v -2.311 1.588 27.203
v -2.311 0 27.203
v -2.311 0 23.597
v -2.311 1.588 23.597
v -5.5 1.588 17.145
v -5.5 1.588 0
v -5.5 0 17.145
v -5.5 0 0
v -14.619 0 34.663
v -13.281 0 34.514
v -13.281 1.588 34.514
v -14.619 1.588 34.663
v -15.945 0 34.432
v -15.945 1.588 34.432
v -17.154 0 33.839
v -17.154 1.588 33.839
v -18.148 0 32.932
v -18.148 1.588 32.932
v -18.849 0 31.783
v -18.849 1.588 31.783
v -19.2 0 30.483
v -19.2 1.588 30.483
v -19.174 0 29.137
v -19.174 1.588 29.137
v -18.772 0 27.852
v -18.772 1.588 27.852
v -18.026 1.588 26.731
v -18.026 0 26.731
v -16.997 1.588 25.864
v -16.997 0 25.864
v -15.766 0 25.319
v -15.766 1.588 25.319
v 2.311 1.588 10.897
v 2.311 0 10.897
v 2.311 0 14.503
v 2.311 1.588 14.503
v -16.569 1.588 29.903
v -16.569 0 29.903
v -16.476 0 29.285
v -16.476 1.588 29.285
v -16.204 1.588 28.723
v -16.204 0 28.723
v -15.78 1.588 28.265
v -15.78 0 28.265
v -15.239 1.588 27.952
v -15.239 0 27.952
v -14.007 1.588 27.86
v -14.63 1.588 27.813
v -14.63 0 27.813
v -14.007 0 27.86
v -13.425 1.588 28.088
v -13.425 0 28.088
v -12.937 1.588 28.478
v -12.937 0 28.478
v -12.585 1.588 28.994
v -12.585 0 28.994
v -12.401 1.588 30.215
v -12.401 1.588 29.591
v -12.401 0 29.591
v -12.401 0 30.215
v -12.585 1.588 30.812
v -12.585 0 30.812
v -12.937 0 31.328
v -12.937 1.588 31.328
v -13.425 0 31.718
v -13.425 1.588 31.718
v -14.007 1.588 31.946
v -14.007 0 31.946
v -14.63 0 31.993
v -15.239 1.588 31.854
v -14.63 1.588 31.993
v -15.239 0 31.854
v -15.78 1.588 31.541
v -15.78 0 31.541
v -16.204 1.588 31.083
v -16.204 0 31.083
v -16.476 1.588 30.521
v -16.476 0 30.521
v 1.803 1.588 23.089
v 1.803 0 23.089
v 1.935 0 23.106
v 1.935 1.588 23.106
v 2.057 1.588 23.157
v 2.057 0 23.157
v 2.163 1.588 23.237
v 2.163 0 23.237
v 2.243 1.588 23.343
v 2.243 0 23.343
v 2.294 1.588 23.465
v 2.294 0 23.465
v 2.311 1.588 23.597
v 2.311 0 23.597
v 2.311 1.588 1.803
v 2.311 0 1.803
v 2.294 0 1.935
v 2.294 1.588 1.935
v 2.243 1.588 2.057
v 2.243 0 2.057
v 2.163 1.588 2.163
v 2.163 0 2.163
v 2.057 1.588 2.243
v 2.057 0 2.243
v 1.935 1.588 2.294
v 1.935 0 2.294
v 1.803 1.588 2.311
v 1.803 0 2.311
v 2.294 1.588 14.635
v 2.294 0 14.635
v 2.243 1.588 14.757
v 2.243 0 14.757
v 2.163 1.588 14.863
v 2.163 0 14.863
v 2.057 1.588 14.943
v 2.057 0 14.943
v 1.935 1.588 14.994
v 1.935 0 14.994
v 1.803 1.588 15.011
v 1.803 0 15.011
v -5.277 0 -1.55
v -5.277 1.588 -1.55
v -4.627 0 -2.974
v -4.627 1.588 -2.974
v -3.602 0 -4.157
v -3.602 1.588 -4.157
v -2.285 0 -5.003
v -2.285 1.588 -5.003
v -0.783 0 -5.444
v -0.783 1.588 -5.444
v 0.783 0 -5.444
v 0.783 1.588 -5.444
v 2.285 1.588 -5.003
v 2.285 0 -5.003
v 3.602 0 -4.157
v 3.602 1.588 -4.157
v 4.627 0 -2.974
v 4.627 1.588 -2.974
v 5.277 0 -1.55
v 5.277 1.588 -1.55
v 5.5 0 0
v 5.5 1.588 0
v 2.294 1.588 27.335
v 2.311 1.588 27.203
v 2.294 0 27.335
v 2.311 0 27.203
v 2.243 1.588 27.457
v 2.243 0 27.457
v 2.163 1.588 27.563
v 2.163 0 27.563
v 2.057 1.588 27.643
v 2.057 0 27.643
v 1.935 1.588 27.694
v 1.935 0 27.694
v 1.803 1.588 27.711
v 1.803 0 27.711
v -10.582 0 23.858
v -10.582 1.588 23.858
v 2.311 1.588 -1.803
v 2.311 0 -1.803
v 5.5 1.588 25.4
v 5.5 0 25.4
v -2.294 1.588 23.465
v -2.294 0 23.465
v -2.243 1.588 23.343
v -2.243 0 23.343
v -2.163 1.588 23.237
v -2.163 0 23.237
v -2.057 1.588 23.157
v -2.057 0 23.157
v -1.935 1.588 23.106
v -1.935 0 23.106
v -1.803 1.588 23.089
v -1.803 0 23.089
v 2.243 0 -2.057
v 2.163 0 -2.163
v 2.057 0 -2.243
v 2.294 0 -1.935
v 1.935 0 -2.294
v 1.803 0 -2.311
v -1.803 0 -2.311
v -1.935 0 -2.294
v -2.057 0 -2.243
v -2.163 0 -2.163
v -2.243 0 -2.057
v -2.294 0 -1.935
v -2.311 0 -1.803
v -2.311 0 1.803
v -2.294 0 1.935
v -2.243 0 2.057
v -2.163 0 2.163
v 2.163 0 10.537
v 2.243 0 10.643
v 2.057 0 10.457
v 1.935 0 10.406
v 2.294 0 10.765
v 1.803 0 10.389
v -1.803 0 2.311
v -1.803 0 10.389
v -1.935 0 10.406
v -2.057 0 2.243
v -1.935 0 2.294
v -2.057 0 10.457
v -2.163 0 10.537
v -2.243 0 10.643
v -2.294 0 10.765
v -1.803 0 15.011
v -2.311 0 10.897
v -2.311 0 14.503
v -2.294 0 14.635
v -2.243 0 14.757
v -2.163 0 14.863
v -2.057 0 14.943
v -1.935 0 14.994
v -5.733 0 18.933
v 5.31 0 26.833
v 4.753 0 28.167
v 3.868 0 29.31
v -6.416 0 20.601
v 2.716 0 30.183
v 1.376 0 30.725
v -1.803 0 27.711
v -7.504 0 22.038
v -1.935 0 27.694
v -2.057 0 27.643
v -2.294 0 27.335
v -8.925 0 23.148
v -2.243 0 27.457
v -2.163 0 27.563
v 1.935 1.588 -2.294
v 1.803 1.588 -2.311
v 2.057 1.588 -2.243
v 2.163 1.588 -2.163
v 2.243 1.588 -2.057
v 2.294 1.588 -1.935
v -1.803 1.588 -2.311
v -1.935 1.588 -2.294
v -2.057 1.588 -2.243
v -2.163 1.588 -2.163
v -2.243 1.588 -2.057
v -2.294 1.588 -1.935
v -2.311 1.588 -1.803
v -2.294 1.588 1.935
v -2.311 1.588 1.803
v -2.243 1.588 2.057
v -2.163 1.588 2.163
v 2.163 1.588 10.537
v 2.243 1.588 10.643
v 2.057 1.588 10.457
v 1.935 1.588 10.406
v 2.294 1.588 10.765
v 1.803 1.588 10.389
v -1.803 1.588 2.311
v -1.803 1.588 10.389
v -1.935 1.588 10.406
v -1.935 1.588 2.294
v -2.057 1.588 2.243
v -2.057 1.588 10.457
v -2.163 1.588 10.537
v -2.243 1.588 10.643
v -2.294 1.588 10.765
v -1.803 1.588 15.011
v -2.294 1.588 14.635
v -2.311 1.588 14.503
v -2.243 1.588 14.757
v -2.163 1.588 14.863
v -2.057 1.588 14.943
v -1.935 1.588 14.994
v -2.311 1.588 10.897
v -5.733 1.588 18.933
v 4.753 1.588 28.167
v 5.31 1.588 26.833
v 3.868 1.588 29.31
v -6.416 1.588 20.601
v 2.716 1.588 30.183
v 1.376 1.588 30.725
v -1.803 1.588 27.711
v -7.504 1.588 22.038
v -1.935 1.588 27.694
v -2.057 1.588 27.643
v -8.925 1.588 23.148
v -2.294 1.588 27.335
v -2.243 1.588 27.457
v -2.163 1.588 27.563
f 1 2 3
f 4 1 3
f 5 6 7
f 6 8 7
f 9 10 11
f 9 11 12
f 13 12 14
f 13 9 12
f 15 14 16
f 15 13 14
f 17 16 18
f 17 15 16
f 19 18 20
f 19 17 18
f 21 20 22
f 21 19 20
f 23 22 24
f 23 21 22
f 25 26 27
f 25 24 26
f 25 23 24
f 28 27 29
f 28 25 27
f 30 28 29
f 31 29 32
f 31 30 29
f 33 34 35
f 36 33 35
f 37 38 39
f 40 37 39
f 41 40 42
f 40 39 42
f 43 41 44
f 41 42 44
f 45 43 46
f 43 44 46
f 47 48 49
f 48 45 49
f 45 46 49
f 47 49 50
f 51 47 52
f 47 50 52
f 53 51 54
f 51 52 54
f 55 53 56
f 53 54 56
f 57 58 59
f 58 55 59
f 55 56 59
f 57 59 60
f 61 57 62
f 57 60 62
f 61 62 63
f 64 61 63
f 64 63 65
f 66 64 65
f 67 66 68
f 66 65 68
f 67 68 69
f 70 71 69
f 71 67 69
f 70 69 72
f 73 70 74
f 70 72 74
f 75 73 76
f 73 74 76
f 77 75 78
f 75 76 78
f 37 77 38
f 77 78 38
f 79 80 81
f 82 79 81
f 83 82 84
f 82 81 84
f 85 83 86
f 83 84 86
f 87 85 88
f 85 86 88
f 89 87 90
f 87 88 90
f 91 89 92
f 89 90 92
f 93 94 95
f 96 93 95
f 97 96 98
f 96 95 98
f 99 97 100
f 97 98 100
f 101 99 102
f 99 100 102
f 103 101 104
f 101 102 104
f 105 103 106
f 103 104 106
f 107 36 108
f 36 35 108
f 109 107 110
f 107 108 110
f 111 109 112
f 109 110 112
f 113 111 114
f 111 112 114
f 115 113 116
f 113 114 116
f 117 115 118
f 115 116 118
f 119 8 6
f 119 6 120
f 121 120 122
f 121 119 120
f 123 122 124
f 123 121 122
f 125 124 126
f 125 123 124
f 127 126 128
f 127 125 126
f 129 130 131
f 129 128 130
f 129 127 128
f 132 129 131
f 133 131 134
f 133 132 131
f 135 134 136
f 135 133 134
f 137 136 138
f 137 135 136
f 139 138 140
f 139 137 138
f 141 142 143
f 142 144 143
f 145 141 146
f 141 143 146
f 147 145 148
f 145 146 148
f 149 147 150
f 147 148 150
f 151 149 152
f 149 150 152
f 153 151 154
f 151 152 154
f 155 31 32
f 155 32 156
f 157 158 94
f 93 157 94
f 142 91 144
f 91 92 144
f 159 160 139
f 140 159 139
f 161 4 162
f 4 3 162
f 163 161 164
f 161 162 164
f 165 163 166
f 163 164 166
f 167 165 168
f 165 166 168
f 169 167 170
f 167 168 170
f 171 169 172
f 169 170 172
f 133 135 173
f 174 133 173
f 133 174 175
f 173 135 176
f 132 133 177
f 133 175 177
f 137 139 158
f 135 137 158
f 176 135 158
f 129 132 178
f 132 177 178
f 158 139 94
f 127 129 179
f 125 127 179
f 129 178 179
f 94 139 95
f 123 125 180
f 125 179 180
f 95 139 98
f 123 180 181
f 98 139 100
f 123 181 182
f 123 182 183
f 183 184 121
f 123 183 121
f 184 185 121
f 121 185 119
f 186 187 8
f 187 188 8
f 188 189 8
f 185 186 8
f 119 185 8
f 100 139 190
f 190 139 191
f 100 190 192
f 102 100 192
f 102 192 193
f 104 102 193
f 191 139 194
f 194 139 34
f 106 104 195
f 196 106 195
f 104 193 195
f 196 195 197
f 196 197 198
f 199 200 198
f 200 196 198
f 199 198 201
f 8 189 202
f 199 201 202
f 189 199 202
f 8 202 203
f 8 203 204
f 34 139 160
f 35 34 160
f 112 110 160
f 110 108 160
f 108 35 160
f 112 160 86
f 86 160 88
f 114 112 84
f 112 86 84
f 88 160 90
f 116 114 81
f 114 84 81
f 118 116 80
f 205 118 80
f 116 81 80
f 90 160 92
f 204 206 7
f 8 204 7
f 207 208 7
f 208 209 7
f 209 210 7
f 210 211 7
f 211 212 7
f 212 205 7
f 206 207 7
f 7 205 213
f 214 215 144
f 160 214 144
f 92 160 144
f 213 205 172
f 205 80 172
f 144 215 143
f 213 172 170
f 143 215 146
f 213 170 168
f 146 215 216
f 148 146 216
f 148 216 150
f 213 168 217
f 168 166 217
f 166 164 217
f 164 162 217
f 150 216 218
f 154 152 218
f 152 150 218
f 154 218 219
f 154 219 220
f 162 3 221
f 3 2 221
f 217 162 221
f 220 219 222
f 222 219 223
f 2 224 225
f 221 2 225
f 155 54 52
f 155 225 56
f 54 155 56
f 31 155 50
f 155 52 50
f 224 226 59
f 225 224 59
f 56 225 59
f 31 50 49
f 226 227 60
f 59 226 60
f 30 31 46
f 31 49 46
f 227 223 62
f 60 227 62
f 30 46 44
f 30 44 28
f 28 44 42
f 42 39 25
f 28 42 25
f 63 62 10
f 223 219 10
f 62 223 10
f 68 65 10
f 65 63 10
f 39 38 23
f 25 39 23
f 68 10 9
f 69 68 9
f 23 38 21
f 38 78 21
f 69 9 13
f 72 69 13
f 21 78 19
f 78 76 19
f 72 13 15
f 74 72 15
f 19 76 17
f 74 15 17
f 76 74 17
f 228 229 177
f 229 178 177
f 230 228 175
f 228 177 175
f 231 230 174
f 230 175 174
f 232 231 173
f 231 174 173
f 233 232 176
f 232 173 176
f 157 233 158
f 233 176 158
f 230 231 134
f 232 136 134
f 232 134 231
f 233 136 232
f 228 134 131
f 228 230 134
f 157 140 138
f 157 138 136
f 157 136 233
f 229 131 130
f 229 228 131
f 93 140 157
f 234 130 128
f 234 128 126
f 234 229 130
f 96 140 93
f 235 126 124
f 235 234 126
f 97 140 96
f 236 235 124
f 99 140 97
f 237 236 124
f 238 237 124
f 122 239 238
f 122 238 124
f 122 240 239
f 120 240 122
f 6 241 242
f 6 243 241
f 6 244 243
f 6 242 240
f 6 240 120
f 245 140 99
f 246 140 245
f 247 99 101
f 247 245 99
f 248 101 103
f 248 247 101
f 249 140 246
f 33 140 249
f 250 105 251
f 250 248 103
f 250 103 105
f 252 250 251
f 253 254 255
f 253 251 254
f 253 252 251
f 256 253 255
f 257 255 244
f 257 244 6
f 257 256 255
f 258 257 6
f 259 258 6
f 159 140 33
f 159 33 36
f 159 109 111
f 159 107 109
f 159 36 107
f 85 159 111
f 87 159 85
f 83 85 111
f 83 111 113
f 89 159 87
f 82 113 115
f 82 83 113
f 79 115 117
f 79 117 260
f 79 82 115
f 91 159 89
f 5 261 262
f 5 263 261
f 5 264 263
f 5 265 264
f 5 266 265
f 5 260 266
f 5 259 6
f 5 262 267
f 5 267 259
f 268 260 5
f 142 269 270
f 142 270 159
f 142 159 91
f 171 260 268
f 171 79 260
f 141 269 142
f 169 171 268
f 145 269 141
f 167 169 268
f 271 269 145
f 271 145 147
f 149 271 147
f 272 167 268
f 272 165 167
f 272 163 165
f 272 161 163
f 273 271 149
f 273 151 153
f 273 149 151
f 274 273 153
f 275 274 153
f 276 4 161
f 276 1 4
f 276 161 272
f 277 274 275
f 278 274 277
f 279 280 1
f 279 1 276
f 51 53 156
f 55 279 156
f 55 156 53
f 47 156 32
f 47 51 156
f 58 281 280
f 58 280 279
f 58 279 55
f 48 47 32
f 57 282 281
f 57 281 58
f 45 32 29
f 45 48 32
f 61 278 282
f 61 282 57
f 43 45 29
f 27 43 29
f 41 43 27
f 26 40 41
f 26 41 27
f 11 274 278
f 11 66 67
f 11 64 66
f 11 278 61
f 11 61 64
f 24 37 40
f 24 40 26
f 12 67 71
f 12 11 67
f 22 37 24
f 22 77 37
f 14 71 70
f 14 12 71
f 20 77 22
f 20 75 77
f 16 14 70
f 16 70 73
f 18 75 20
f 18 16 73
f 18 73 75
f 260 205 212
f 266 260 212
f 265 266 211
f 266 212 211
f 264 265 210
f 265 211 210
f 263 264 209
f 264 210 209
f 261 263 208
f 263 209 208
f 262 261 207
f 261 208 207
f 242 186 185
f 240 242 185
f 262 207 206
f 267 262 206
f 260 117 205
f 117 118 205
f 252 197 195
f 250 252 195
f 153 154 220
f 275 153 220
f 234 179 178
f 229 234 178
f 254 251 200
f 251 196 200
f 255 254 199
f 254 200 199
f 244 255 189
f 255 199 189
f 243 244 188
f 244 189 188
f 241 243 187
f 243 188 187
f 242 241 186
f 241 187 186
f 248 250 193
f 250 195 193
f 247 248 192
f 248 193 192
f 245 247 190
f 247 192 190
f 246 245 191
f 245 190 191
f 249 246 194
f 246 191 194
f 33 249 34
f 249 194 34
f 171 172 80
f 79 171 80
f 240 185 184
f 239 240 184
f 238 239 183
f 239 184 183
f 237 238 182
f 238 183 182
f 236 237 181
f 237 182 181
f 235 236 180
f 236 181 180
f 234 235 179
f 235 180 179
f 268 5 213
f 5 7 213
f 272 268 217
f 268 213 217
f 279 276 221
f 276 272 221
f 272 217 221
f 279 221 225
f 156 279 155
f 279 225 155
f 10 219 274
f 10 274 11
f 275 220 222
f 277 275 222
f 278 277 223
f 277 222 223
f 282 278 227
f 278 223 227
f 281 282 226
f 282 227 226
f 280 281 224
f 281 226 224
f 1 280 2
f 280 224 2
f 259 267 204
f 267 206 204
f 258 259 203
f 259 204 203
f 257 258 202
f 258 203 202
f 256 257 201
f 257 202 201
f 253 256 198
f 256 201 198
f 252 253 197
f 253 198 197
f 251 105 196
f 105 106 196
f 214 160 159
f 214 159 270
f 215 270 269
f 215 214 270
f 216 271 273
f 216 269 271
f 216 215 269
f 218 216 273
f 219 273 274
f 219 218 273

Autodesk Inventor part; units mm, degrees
ref_plane "YZ Plane" through (0, 0, 0) normal (1, 0, 0) x (0, 1, 0)
ref_plane "XZ Plane" through (0, 0, 0) normal (0, 1, 0) x (-1, 0, 0)
ref_plane "XY Plane" through (0, 0, 0) normal (0, 0, 1) x (1, 0, 0)
sketch "hole" plane through (0, 0, 0) normal (0, 0, 1) x (1, 0, 0)
  line L0 (16.5616, -7.6441) -> (20.1684, -7.6441)
  line L1 (20.6764, -8.1521) -> (20.6764, -11.7589)
  line L2 (20.1684, -12.2669) -> (16.5616, -12.2669)
  line L3 (16.0536, -11.7589) -> (16.0536, -8.1521)
  line L4 (16.0536, -7.6441) -> (20.6764, -12.2669) construction
  line L5 (20.6764, -7.6441) -> (16.0536, -12.2669) construction
  arc A0 (20.6764, -8.1521) -> (20.1684, -7.6441) centre (20.1684, -8.1521) ccw
  arc A1 (20.1684, -12.2669) -> (20.6764, -11.7589) centre (20.1684, -11.7589) ccw
  arc A2 (16.0536, -11.7589) -> (16.5616, -12.2669) centre (16.5616, -11.7589) ccw
  arc A3 (16.5616, -7.6441) -> (16.0536, -8.1521) centre (16.5616, -8.1521) ccw
  point P0 (18.365, -9.9555)
  dimension "d6" = 4.6228
  dimension "d7" = 4.6228
  dimension "d8" = 0.508
sketch "main" plane through (0, 0, 0) normal (0, 0, 1) x (1, 0, 0)
  arc A0 (12.865, -9.9555) -> (23.865, -9.9555) centre (18.365, -9.9555) ccw
  line L0 (12.865, 15.4445) -> (12.865, -9.9555)
  line L1 (23.865, -9.9555) -> (23.865, 7.1895)
  circle A1 centre (32.8381, 19.9475) radius 2.0955
  arc A2 (34.1305, 15.3637) -> (31.6462, 24.5584) centre (32.8381, 19.9475) ccw
  arc A3 (16.9885, 20.7695) -> (12.865, 15.4445) centre (18.365, 15.4445) ccw
  line L2 (16.9885, 20.7695) -> (31.6462, 24.5584)
  line L3 (34.1305, 15.3637) -> (28.9468, 13.9022)
  arc A4 (28.9468, 13.9022) -> (23.865, 7.1895) centre (30.8394, 7.1895) ccw
  line L4 (16.5616, -7.6441) -> (20.1684, -7.6441)
  line L5 (20.6764, -8.1521) -> (20.6764, -11.7589)
  line L6 (20.1684, -12.2669) -> (16.5616, -12.2669)
  line L7 (16.0536, -11.7589) -> (16.0536, -8.1521)
  line L8 (16.0536, -7.6441) -> (20.6764, -12.2669) construction
  line L9 (20.6764, -7.6441) -> (16.0536, -12.2669) construction
  arc A5 (20.6764, -8.1521) -> (20.1684, -7.6441) centre (20.1684, -8.1521) ccw
  arc A6 (20.1684, -12.2669) -> (20.6764, -11.7589) centre (20.1684, -11.7589) ccw
  arc A7 (16.0536, -11.7589) -> (16.5616, -12.2669) centre (16.5616, -11.7589) ccw
  arc A8 (16.5616, -7.6441) -> (16.0536, -8.1521) centre (16.5616, -8.1521) ccw
  line L10 (16.5616, 5.0559) -> (20.1684, 5.0559)
  line L11 (20.6764, 4.5479) -> (20.6764, 0.9411)
  line L12 (20.1684, 0.4331) -> (16.5616, 0.4331)
  line L13 (16.0536, 0.9411) -> (16.0536, 4.5479)
  line L14 (16.0536, 5.0559) -> (20.6764, 0.4331) construction
  line L15 (20.6764, 5.0559) -> (16.0536, 0.4331) construction
  arc A9 (20.6764, 4.5479) -> (20.1684, 5.0559) centre (20.1684, 4.5479) ccw
  arc A10 (20.1684, 0.4331) -> (20.6764, 0.9411) centre (20.1684, 0.9411) ccw
  arc A11 (16.0536, 0.9411) -> (16.5616, 0.4331) centre (16.5616, 0.9411) ccw
  arc A12 (16.5616, 5.0559) -> (16.0536, 4.5479) centre (16.5616, 4.5479) ccw
  line L16 (16.5616, 17.7559) -> (20.1684, 17.7559)
  line L17 (20.6764, 17.2479) -> (20.6764, 13.6411)
  line L18 (20.1684, 13.1331) -> (16.5616, 13.1331)
  line L19 (16.0536, 13.6411) -> (16.0536, 17.2479)
  line L20 (16.0536, 17.7559) -> (20.6764, 13.1331) construction
  line L21 (20.6764, 17.7559) -> (16.0536, 13.1331) construction
  arc A13 (20.6764, 17.2479) -> (20.1684, 17.7559) centre (20.1684, 17.2479) ccw
  arc A14 (20.1684, 13.1331) -> (20.6764, 13.6411) centre (20.1684, 13.6411) ccw
  arc A15 (16.0536, 13.6411) -> (16.5616, 13.1331) centre (16.5616, 13.6411) ccw
  arc A16 (16.5616, 17.7559) -> (16.0536, 17.2479) centre (16.5616, 17.2479) ccw
  point P0 (22.8879, 4.6952)
  dimension "d9" = 12.7
  dimension "d10" = 12.7
  dimension "d12" = 17.145
sketch "Sketch1" plane through (0, 0, 0) normal (0, 1, 0) x (-1, 0, 0)
  arc A0 (-5.5, 0) -> (5.5, 0) centre (0, 0) ccw
  line L0 (-5.5, 25.4) -> (-5.5, 0)
  line L1 (5.5, 0) -> (5.5, 17.145)
  circle A1 centre (14.4731, 29.903) radius 2.0955
  arc A2 (15.7655, 25.3192) -> (13.2812, 34.5139) centre (14.4731, 29.903) ccw
  arc A3 (-1.3765, 30.725) -> (-5.5, 25.4) centre (0, 25.4) ccw
  line L2 (-1.3765, 30.725) -> (13.2812, 34.5139)
  line L3 (15.7655, 25.3192) -> (10.5818, 23.8577)
  arc A4 (10.5818, 23.8577) -> (5.5, 17.145) centre (12.4744, 17.145) ccw
  line L4 (-1.8034, 2.3114) -> (1.8034, 2.3114)
  line L5 (2.3114, 1.8034) -> (2.3114, -1.8034)
  line L6 (1.8034, -2.3114) -> (-1.8034, -2.3114)
  line L7 (-2.3114, -1.8034) -> (-2.3114, 1.8034)
  line L8 (-2.3114, 2.3114) -> (2.3114, -2.3114) construction
  line L9 (2.3114, 2.3114) -> (-2.3114, -2.3114) construction
  arc A5 (2.3114, 1.8034) -> (1.8034, 2.3114) centre (1.8034, 1.8034) ccw
  arc A6 (1.8034, -2.3114) -> (2.3114, -1.8034) centre (1.8034, -1.8034) ccw
  arc A7 (-2.3114, -1.8034) -> (-1.8034, -2.3114) centre (-1.8034, -1.8034) ccw
  arc A8 (-1.8034, 2.3114) -> (-2.3114, 1.8034) centre (-1.8034, 1.8034) ccw
  line L10 (-1.8034, 15.0114) -> (1.8034, 15.0114)
  line L11 (2.3114, 14.5034) -> (2.3114, 10.8966)
  line L12 (1.8034, 10.3886) -> (-1.8034, 10.3886)
  line L13 (-2.3114, 10.8966) -> (-2.3114, 14.5034)
  line L14 (-2.3114, 15.0114) -> (2.3114, 10.3886) construction
  line L15 (2.3114, 15.0114) -> (-2.3114, 10.3886) construction
  arc A9 (2.3114, 14.5034) -> (1.8034, 15.0114) centre (1.8034, 14.5034) ccw
  arc A10 (1.8034, 10.3886) -> (2.3114, 10.8966) centre (1.8034, 10.8966) ccw
  arc A11 (-2.3114, 10.8966) -> (-1.8034, 10.3886) centre (-1.8034, 10.8966) ccw
  arc A12 (-1.8034, 15.0114) -> (-2.3114, 14.5034) centre (-1.8034, 14.5034) ccw
  line L16 (-1.8034, 27.7114) -> (1.8034, 27.7114)
  line L17 (2.3114, 27.2034) -> (2.3114, 23.5966)
  line L18 (1.8034, 23.0886) -> (-1.8034, 23.0886)
  line L19 (-2.3114, 23.5966) -> (-2.3114, 27.2034)
  line L20 (-2.3114, 27.7114) -> (2.3114, 23.0886) construction
  line L21 (2.3114, 27.7114) -> (-2.3114, 23.0886) construction
  arc A13 (2.3114, 27.2034) -> (1.8034, 27.7114) centre (1.8034, 27.2034) ccw
  arc A14 (1.8034, 23.0886) -> (2.3114, 23.5966) centre (1.8034, 23.5966) ccw
  arc A15 (-2.3114, 23.5966) -> (-1.8034, 23.0886) centre (-1.8034, 23.5966) ccw
  arc A16 (-1.8034, 27.7114) -> (-2.3114, 27.2034) centre (-1.8034, 27.2034) ccw
extrude "Extrusion1" add sketch "Sketch1" along normal blind 1.5875
properties part number "bent_gusset_improved" material "Acetal Resin, White"
